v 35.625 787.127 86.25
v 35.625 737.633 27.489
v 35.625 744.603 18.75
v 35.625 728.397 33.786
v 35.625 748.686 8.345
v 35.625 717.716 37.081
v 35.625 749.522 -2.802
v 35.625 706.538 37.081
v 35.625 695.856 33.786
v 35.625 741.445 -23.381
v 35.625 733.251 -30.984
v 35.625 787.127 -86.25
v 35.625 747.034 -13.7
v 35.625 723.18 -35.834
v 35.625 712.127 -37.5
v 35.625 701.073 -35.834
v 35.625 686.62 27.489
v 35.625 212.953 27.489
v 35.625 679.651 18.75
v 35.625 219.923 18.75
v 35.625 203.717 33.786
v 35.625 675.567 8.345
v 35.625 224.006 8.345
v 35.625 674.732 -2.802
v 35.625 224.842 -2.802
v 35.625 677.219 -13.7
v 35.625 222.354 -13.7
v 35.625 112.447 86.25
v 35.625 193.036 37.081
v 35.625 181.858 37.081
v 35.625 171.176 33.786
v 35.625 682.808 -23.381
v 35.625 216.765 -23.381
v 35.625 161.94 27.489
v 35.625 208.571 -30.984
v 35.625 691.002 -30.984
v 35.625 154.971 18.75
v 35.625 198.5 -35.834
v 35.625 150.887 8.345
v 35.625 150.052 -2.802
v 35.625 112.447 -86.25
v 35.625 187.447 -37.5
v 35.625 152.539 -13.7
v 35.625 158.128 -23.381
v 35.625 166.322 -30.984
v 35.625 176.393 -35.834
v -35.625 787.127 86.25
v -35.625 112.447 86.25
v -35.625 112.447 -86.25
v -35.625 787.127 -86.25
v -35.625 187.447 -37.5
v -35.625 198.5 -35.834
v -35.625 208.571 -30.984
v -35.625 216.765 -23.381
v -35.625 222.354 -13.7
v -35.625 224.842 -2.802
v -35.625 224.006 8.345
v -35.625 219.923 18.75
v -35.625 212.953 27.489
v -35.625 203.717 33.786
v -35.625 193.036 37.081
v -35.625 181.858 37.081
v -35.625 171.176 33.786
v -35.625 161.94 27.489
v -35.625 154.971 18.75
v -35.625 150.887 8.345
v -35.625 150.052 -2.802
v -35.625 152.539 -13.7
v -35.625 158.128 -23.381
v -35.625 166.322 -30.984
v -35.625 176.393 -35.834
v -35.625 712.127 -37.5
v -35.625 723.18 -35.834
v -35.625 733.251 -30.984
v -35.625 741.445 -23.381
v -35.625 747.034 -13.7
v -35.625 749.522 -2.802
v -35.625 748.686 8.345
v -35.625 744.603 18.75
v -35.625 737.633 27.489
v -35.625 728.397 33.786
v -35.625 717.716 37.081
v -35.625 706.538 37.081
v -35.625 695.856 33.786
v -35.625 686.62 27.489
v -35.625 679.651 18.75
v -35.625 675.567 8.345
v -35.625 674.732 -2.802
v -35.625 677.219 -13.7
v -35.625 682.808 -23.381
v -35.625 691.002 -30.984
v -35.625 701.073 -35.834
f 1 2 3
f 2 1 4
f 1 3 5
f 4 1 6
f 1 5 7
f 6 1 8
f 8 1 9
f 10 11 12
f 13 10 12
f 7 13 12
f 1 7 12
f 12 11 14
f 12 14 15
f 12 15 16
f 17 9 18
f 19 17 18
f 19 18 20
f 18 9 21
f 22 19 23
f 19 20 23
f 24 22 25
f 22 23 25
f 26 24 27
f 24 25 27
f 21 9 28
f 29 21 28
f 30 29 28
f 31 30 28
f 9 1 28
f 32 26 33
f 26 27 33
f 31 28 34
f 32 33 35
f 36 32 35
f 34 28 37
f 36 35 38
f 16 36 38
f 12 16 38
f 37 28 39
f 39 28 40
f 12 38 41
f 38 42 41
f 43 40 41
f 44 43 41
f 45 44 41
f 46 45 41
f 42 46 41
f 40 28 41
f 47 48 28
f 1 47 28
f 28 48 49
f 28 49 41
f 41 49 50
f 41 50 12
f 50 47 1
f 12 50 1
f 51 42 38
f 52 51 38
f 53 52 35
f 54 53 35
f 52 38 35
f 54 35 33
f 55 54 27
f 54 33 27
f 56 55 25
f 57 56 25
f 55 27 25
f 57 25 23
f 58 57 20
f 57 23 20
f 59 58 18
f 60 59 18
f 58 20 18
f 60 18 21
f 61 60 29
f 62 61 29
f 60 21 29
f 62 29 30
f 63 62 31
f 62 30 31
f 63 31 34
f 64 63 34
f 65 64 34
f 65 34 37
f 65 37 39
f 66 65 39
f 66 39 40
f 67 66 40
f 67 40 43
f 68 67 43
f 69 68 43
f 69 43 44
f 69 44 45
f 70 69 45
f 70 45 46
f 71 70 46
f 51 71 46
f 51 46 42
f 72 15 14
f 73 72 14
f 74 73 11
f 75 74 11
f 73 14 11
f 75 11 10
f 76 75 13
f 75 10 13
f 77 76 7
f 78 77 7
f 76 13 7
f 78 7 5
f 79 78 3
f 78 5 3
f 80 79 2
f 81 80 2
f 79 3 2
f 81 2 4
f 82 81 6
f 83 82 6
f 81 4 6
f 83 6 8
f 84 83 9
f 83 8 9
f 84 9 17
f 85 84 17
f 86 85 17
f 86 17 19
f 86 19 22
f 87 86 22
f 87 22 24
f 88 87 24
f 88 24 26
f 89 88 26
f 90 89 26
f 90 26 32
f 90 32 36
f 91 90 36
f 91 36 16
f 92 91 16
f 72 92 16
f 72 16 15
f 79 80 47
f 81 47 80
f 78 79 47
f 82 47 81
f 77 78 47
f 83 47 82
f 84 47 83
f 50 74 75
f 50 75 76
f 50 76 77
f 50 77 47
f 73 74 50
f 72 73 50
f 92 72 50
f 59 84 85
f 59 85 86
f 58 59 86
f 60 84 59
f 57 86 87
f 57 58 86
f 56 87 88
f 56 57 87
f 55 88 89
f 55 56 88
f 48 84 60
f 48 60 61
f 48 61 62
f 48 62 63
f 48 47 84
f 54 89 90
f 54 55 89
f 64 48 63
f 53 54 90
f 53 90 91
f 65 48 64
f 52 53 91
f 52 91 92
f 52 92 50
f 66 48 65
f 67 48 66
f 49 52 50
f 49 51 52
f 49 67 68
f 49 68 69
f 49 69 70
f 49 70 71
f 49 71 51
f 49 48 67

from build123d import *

# Parameters (mm, degrees)
SKETCH1_W           = 95
SKETCH1_H           = 230
BOSS_EXTRUDE1_DEPTH = 899.573333333
SKETCH2_R           = 50
CUT_EXTRUDE1_DEPTH  = 1200
SKETCH5_R           = 50
CUT_EXTRUDE4_DEPTH  = 226
SCALE1_SCALE        = 0.75


with BuildPart() as part:
    # Sketch1 → Boss-Extrude1 (new body)
    with BuildSketch(Plane(origin=(0, 0, 0), x_dir=(1, 0, 0), z_dir=(0, 1, 0))):
        Rectangle(SKETCH1_W, SKETCH1_H)
    extrude(amount=BOSS_EXTRUDE1_DEPTH)

    # Sketch2 → Cut-Extrude1 (cut)
    with BuildSketch(Plane(origin=(47.5, 0, 0), x_dir=(0, 0, -1), z_dir=(1, 0, 0))):
        with Locations((0, 799.573333333)):
            Circle(SKETCH2_R)
    extrude(amount=-CUT_EXTRUDE1_DEPTH, mode=Mode.SUBTRACT)

    # Sketch5 → Cut-Extrude4 (cut)
    with BuildSketch(Plane(origin=(47.5, 0, 0), x_dir=(0, 0, -1), z_dir=(1, 0, 0))):
        with Locations((0, 100)):
            Circle(SKETCH5_R)
    extrude(amount=-CUT_EXTRUDE4_DEPTH, mode=Mode.SUBTRACT)


with BuildPart() as part_1:
    # Scale1: scaled about (0, 449.786666667, 0)
    add(part.part.scale(SCALE1_SCALE).moved(Location((0, 112.446666667, 0))))


solid = part_1.part
